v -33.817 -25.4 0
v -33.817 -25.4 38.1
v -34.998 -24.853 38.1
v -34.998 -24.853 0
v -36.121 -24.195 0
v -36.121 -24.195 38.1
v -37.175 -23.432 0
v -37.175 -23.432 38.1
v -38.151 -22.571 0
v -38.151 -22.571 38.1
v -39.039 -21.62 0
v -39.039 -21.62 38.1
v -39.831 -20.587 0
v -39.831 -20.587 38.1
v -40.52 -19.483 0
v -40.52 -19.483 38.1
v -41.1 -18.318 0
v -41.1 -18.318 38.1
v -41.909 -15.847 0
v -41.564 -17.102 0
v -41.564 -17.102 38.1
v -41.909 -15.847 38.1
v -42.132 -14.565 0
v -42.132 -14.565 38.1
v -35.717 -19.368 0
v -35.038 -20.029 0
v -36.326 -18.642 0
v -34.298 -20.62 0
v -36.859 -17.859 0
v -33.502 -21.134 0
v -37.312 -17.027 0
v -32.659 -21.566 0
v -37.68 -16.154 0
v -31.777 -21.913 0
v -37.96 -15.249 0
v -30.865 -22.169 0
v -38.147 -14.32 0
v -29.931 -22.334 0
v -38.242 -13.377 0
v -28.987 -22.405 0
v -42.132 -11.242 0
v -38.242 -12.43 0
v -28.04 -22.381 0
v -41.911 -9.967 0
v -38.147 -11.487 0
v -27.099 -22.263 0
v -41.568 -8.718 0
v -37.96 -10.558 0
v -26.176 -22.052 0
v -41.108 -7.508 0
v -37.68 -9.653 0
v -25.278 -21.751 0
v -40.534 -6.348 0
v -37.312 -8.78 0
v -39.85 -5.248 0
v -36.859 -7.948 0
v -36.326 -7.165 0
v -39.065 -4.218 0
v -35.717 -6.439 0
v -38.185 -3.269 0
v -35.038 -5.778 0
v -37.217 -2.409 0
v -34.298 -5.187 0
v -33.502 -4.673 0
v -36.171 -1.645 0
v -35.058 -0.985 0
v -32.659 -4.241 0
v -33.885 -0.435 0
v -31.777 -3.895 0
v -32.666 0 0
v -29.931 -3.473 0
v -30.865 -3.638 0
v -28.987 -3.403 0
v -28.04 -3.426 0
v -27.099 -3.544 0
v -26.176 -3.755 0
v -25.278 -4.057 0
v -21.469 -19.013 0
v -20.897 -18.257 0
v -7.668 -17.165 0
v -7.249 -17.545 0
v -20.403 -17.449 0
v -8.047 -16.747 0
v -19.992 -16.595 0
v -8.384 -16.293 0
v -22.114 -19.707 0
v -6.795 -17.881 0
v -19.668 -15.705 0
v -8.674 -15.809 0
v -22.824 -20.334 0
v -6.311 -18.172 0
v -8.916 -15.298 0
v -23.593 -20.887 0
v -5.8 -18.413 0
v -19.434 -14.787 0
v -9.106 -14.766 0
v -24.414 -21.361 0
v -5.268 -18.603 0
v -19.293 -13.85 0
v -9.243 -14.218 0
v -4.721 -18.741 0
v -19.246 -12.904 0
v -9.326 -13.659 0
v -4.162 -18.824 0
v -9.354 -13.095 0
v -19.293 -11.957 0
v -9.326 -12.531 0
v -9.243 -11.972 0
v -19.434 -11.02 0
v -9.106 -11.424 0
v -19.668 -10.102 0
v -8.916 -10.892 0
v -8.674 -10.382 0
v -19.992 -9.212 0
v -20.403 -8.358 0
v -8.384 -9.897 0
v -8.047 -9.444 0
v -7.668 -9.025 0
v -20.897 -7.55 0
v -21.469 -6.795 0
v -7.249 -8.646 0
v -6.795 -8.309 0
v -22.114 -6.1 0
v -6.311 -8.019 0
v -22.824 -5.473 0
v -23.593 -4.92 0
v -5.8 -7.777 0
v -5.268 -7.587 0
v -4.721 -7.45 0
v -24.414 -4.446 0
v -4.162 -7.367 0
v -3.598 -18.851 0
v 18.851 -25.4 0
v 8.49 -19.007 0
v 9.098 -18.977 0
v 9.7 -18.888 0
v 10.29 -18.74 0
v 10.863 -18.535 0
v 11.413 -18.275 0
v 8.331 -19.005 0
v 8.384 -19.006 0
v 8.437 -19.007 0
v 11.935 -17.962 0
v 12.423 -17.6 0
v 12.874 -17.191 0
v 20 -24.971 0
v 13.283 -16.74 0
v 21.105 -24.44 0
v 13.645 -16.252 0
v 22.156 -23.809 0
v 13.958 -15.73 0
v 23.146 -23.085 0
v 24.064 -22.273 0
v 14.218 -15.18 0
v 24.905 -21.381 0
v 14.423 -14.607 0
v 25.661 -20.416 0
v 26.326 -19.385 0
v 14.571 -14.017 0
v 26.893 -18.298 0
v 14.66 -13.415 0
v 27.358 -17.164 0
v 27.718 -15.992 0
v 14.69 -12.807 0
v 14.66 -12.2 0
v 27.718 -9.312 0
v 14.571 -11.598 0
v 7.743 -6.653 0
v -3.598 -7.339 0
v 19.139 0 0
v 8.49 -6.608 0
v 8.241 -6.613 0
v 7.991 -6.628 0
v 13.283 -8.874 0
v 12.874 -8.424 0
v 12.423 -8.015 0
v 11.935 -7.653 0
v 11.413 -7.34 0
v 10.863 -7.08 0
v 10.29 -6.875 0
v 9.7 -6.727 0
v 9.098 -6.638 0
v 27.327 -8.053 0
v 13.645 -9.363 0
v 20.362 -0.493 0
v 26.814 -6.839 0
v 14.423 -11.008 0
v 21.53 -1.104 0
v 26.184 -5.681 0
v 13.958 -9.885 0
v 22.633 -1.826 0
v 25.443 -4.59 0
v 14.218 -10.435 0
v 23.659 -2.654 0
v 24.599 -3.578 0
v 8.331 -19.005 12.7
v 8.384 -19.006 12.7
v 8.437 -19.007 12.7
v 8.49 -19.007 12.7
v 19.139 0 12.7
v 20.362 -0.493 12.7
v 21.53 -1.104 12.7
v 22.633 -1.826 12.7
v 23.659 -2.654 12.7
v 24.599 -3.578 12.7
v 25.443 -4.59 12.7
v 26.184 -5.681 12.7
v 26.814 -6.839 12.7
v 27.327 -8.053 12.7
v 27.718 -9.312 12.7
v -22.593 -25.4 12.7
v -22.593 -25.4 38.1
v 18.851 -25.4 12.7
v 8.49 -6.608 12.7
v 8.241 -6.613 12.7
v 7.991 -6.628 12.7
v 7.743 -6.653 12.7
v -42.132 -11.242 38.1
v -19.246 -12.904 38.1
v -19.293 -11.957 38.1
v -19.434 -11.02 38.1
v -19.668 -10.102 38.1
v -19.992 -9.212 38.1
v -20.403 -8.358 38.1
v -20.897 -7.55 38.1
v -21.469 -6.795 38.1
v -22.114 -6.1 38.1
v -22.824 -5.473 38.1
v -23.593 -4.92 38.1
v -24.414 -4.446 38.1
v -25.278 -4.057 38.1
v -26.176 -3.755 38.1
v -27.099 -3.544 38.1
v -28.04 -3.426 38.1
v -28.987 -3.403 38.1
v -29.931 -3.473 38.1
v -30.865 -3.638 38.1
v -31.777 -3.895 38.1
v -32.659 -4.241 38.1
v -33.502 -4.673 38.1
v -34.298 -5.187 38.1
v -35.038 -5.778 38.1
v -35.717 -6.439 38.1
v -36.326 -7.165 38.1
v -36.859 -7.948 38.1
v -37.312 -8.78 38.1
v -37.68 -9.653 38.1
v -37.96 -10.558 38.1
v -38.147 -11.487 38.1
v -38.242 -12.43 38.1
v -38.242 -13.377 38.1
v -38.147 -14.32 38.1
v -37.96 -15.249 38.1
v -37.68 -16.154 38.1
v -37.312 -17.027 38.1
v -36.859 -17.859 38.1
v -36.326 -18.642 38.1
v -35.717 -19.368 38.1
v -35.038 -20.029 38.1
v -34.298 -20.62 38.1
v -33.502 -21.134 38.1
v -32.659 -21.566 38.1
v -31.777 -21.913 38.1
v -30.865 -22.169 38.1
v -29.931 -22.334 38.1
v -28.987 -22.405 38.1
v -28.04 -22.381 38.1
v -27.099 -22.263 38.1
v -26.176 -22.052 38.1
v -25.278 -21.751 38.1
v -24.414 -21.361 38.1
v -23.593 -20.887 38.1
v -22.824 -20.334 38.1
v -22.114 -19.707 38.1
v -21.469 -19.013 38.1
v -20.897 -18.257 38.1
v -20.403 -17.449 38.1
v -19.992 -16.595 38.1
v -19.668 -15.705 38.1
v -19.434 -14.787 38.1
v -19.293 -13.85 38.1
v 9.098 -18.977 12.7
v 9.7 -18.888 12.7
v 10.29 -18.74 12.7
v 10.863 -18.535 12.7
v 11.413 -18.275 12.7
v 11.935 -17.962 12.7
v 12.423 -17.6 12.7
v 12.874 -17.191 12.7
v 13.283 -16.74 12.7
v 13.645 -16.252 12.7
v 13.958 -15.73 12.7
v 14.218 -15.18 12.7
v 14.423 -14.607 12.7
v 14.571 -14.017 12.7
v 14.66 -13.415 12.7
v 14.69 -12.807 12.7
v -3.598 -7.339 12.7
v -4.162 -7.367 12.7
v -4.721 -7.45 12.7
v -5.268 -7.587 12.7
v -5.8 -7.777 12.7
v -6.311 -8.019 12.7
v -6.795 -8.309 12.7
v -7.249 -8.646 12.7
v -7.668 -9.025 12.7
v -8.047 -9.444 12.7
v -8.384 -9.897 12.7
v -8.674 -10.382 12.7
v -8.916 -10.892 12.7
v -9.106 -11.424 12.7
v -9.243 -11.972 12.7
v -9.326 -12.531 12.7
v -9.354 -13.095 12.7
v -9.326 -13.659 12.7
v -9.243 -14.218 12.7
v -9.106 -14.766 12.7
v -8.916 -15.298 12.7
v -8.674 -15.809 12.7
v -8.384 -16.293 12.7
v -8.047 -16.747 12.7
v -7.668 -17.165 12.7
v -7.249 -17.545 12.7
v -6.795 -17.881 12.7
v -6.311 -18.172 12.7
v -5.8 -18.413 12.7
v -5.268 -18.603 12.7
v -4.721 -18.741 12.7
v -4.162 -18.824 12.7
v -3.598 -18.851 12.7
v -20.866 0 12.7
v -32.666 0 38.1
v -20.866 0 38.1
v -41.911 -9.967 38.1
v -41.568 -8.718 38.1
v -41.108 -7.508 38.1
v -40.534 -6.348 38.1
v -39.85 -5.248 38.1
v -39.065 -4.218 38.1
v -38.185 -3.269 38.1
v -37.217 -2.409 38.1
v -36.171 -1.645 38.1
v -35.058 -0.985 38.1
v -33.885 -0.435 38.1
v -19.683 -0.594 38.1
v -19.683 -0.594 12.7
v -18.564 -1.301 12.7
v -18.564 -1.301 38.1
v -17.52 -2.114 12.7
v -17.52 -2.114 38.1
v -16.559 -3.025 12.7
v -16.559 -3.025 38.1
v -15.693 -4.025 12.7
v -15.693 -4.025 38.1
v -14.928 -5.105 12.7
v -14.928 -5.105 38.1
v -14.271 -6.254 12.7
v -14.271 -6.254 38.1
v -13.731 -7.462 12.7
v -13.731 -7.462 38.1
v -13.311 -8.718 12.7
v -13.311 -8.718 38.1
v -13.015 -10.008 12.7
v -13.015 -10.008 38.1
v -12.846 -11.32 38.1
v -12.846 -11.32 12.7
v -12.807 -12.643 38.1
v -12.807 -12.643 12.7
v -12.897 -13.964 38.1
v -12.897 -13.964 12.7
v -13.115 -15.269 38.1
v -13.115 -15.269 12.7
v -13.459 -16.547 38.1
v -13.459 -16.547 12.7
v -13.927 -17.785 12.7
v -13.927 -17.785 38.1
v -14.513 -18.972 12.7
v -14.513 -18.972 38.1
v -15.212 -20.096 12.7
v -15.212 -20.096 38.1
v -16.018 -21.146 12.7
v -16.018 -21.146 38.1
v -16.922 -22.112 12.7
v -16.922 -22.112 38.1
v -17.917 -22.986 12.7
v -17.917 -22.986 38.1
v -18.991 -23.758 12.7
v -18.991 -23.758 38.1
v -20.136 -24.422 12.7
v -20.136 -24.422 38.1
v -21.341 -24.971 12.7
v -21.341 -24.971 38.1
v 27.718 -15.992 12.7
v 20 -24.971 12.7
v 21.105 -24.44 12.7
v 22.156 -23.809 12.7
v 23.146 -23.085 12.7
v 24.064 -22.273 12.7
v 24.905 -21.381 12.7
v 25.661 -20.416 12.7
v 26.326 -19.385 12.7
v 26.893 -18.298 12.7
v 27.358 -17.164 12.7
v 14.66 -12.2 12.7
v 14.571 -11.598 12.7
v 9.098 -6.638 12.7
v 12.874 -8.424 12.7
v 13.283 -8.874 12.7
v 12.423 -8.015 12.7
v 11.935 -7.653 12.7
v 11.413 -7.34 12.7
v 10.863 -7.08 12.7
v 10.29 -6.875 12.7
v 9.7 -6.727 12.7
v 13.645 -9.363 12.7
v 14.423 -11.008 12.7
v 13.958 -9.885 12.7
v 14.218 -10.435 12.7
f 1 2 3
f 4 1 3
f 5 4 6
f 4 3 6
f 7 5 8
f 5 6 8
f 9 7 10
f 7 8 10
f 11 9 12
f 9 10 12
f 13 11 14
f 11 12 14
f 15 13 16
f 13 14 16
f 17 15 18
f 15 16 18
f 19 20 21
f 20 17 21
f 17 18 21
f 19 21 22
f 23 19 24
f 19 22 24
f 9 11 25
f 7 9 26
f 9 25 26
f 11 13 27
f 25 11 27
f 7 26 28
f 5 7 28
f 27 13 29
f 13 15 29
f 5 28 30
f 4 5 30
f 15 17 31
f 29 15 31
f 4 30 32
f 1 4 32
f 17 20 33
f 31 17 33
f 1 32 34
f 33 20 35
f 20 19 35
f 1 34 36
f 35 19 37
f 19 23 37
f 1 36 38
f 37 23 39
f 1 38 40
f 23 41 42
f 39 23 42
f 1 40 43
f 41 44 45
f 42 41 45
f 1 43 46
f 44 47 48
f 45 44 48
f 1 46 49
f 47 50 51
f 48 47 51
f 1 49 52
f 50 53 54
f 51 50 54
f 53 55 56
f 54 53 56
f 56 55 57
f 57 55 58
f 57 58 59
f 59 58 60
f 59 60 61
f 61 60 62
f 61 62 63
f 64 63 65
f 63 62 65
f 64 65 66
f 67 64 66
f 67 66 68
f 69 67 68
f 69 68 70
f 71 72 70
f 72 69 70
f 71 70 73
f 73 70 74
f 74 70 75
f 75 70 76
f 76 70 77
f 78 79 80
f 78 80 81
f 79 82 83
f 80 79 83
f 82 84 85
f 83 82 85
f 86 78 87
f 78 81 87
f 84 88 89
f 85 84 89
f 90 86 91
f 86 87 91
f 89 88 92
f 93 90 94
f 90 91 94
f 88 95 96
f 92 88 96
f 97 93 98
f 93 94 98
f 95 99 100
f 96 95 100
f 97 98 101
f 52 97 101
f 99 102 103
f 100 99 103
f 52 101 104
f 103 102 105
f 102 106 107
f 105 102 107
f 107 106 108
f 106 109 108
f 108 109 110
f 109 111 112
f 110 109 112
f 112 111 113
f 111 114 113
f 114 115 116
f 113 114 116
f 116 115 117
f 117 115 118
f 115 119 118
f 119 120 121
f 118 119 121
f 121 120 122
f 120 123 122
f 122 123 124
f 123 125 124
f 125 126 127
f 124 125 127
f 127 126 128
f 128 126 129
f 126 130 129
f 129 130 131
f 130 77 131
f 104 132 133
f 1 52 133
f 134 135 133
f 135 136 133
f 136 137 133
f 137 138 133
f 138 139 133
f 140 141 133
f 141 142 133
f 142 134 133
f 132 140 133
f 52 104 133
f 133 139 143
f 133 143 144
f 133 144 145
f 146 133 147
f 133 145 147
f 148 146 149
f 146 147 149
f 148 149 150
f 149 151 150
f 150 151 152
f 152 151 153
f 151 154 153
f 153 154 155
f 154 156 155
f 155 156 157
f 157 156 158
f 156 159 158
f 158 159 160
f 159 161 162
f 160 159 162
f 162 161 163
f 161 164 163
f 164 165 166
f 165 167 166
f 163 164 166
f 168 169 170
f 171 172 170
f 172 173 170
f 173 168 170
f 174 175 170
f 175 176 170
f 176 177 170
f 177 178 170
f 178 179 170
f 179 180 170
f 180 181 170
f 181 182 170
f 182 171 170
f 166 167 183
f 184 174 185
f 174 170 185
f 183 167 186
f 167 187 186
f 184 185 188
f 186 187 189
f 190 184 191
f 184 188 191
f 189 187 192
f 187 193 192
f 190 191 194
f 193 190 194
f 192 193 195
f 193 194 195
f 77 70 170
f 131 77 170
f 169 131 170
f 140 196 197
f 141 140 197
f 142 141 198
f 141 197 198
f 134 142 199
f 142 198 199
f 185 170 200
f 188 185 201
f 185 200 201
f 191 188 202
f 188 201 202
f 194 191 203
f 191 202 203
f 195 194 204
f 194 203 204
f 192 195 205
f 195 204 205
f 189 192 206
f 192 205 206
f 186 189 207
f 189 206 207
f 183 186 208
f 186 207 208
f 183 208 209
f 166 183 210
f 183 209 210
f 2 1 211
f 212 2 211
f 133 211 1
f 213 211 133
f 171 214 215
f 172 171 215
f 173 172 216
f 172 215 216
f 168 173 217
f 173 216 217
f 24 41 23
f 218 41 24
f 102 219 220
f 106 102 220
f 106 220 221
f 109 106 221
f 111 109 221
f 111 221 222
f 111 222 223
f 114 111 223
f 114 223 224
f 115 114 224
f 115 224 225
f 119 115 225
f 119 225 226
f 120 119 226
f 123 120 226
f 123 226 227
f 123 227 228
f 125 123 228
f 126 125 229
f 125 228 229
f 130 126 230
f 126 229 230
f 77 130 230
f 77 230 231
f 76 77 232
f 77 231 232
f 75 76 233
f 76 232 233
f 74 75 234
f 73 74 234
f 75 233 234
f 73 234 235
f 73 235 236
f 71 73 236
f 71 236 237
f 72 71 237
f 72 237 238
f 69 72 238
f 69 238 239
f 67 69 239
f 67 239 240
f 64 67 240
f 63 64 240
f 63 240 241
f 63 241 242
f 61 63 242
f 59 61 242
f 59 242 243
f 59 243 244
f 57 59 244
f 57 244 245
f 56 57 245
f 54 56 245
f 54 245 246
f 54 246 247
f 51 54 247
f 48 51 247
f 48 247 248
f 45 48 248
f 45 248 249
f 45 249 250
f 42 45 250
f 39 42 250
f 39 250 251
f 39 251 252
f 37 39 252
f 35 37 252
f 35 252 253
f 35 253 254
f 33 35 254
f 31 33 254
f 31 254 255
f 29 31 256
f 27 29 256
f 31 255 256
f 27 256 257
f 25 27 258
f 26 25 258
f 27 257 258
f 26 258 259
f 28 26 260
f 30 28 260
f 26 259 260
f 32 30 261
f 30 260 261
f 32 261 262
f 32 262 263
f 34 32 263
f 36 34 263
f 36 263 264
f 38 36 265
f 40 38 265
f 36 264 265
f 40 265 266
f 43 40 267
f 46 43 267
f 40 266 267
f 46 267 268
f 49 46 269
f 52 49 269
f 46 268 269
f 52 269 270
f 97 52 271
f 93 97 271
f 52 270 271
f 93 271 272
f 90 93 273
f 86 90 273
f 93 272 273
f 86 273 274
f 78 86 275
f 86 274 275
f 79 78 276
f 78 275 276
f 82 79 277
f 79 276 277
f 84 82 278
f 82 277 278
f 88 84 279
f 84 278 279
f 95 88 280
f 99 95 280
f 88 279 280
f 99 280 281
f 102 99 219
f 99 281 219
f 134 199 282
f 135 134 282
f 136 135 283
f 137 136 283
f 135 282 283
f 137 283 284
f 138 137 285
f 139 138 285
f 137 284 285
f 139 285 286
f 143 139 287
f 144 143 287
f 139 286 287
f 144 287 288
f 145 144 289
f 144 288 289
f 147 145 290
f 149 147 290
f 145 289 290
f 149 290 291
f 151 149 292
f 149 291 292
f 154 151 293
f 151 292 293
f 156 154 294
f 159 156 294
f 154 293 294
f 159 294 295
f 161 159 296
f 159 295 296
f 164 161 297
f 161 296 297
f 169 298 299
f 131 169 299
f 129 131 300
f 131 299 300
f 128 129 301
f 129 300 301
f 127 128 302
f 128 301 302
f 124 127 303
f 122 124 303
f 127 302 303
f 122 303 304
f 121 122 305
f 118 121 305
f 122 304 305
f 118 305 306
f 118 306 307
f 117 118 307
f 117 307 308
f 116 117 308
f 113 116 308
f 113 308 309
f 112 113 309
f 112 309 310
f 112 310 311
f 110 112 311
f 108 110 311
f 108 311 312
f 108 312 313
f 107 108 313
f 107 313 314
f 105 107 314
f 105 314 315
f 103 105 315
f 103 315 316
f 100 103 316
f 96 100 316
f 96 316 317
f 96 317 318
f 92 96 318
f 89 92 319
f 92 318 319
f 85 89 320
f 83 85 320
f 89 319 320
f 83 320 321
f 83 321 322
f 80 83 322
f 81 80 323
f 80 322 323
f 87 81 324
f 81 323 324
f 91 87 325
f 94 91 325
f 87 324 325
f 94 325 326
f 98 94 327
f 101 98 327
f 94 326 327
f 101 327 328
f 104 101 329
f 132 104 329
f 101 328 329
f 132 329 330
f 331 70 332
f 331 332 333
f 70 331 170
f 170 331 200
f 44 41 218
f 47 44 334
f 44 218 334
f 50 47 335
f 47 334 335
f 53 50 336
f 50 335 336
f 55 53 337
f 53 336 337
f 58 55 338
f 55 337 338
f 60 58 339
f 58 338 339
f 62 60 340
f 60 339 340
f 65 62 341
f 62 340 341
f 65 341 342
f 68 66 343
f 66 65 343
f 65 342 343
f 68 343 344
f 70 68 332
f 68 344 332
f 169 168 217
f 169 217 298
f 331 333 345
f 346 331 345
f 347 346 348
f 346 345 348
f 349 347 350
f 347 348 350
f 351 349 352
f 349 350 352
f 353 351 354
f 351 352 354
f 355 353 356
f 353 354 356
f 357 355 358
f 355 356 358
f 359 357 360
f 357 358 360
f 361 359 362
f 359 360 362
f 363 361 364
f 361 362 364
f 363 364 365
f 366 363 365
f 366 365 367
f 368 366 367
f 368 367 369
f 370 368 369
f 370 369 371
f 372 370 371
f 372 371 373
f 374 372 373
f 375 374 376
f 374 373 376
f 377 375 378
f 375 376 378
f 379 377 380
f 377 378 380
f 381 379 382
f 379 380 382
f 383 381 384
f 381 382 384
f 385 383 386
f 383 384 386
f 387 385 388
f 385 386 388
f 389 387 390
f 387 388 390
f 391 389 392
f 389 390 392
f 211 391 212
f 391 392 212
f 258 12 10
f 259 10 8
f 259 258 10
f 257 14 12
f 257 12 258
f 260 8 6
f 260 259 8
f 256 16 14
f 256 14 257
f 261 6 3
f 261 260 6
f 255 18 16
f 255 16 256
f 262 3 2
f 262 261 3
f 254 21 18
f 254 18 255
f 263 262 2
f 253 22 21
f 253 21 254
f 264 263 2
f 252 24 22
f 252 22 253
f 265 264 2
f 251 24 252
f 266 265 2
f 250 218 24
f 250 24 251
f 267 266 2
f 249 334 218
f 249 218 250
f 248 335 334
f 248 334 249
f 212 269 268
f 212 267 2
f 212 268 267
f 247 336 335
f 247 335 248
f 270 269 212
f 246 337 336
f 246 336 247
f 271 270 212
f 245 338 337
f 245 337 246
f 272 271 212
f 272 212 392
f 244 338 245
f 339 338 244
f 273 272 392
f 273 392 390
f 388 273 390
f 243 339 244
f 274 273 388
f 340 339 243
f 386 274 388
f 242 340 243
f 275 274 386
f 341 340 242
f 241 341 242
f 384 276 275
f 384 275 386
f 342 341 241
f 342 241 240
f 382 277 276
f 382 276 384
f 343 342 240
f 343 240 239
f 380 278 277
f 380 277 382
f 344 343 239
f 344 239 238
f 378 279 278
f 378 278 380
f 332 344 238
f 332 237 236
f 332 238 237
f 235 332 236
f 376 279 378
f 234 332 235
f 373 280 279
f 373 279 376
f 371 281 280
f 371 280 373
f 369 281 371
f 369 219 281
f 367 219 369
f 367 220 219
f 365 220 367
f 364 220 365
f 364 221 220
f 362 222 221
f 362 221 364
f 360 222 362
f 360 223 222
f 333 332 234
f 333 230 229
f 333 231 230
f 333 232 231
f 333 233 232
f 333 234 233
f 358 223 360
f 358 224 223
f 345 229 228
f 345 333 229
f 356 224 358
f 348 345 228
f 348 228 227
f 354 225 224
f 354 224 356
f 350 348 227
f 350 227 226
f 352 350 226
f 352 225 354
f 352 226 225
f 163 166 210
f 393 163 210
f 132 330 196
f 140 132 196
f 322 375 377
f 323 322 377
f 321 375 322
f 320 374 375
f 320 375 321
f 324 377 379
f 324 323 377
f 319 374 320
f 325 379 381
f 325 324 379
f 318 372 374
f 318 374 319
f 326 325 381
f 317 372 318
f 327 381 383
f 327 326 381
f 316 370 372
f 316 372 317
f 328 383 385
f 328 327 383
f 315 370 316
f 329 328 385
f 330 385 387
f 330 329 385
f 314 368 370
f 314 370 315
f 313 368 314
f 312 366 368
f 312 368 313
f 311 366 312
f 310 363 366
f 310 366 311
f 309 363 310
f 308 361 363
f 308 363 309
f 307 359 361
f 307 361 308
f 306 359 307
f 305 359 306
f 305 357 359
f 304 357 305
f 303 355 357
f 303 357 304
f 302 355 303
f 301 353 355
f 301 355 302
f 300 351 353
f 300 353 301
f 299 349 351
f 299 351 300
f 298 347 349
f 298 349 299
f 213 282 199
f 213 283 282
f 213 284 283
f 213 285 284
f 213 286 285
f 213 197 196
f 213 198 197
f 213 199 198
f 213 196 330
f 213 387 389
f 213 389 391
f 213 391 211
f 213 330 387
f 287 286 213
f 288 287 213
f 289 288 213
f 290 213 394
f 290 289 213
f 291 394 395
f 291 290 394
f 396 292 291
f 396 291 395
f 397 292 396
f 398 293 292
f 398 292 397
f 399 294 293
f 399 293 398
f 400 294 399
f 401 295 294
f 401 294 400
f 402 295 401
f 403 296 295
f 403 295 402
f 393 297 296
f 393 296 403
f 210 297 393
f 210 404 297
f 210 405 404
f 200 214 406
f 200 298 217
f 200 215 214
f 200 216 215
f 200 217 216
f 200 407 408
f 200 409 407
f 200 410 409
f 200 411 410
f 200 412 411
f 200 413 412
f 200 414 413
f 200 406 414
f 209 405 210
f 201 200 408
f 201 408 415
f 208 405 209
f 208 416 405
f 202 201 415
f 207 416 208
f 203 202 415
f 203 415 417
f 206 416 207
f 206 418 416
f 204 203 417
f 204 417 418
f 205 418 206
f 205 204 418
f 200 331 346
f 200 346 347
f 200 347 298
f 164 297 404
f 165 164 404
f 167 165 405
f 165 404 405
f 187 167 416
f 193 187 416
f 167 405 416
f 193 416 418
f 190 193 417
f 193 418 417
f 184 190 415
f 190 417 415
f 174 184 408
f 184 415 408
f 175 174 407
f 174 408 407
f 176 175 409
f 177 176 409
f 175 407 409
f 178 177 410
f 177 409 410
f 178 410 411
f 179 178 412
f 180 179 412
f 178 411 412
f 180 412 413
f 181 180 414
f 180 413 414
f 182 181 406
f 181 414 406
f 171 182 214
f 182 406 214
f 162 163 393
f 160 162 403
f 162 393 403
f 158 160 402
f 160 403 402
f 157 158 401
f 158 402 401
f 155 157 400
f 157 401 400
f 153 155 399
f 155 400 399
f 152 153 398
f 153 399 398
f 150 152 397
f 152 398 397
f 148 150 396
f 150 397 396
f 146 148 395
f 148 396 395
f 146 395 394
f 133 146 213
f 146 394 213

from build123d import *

# Parameters (mm, degrees)
F0_W     = 69.85
F0_H     = 38.1
F1_DEPTH = 25.4
F3_DEPTH = 38.101
F5_DEPTH = 25.4
F6_R     = 9.503883
F7_DEPTH = 38.101
F9_DEPTH = 12.701


with BuildPart() as f1:
    # F0 (on Front) → F1 (new body)
    with BuildSketch(Plane.XZ):
        with Locations((-7.206795, 19.05)):
            Rectangle(F0_W, F0_H)
    extrude(amount=F1_DEPTH)

    # F2 (on face) → F3 (cut, through all)
    with BuildSketch(Plane.XY.offset(38.1)):
        with BuildLine():
            ThreePointArc((-42.131795, -11.242362), (-39.065027, -4.218313), (-32.665953, 0))
            Line((-32.665953, 0), (-42.131795, 0))
            Line((-42.131795, 0), (-42.131795, -11.242362))
        make_face()
        with BuildLine():
            ThreePointArc((-33.817176, -25.4), (-39.447694, -21.112905), (-42.131795, -14.564811))
            Line((-42.131795, -14.564811), (-42.131795, -25.4))
            Line((-42.131795, -25.4), (-33.817176, -25.4))
        make_face()
        with BuildLine():
            Line((27.718205, -25.4), (27.718205, -15.992137))
            ThreePointArc((27.718205, -15.992137), (24.495171, -21.836901), (18.851276, -25.4))
            Line((18.851276, -25.4), (27.718205, -25.4))
        make_face()
        with BuildLine():
            Line((27.718205, 0), (19.139083, 0))
            ThreePointArc((19.139083, 0), (24.598614, -3.577897), (27.718205, -9.311655))
            Line((27.718205, -9.311655), (27.718205, 0))
        make_face()
    extrude(amount=-F3_DEPTH, mode=Mode.SUBTRACT)

    # F4 (on face) → F5 (cut)
    with BuildSketch(Plane.XY.offset(38.1)):
        with BuildLine():
            ThreePointArc((-20.865917, 0), (-12.835523, -13.304651), (-22.592751, -25.4))
            Line((-22.592751, -25.4), (18.851276, -25.4))
            ThreePointArc((18.851276, -25.4), (24.495171, -21.836901), (27.718205, -15.992137))
            Line((27.718205, -15.992137), (27.718205, -9.311655))
            ThreePointArc((27.718205, -9.311655), (24.598614, -3.577897), (19.139083, 0))
            Line((19.139083, 0), (-20.865917, 0))
        make_face()
    extrude(amount=-F5_DEPTH, mode=Mode.SUBTRACT)

    # F6 (on face) → F7 (cut, through all)
    with BuildSketch(Plane.XY.offset(38.1)):
        with Locations((-28.749728, -12.903587)):
            Circle(F6_R)
    extrude(amount=-F7_DEPTH, mode=Mode.SUBTRACT)

    # F8 (on face) → F9 (cut, through all)
    with BuildSketch(Plane.XY.offset(12.7)):
        with BuildLine():
            ThreePointArc((-3.597571, -18.851277), (0.472617, -17.16535), (2.158544, -13.095162))
            ThreePointArc((2.158544, -13.095162), (0.472617, -9.024974), (-3.597571, -7.339047))
            ThreePointArc((-3.597571, -7.339047), (-9.353686, -13.095162), (-3.597571, -18.851277))
        make_face()
        with BuildLine():
            ThreePointArc((-3.597571, -7.339047), (0.472617, -9.024974), (2.158544, -13.095162))
            ThreePointArc((2.158544, -13.095162), (0.472617, -17.16535), (-3.597571, -18.851277))
            Line((-3.597571, -18.851277), (8.330685, -19.004828))
            ThreePointArc((8.330685, -19.004828), (2.29775, -13.102009), (7.742962, -6.653036))
            Line((7.742962, -6.653036), (-3.597571, -7.339047))
        make_face()
        with BuildLine():
            Line((8.49027, -6.60783), (7.742962, -6.653036))
            ThreePointArc((7.742962, -6.653036), (2.29775, -13.102009), (8.330685, -19.004828))
            Line((8.330685, -19.004828), (8.49027, -19.006882))
            ThreePointArc((8.49027, -19.006882), (12.873997, -17.191083), (14.689796, -12.807356))
            ThreePointArc((14.689796, -12.807356), (12.873997, -8.423629), (8.49027, -6.60783))
        make_face()
        with BuildLine():
            ThreePointArc((8.49027, -6.60783), (8.115933, -6.619142), (7.742962, -6.653036))
            Line((7.742962, -6.653036), (8.49027, -6.60783))
        make_face()
        with BuildLine():
            Line((8.49027, -19.006882), (8.330685, -19.004828))
            ThreePointArc((8.330685, -19.004828), (8.410471, -19.006368), (8.49027, -19.006882))
        make_face()
    extrude(amount=-F9_DEPTH, mode=Mode.SUBTRACT)


solid = f1.part
